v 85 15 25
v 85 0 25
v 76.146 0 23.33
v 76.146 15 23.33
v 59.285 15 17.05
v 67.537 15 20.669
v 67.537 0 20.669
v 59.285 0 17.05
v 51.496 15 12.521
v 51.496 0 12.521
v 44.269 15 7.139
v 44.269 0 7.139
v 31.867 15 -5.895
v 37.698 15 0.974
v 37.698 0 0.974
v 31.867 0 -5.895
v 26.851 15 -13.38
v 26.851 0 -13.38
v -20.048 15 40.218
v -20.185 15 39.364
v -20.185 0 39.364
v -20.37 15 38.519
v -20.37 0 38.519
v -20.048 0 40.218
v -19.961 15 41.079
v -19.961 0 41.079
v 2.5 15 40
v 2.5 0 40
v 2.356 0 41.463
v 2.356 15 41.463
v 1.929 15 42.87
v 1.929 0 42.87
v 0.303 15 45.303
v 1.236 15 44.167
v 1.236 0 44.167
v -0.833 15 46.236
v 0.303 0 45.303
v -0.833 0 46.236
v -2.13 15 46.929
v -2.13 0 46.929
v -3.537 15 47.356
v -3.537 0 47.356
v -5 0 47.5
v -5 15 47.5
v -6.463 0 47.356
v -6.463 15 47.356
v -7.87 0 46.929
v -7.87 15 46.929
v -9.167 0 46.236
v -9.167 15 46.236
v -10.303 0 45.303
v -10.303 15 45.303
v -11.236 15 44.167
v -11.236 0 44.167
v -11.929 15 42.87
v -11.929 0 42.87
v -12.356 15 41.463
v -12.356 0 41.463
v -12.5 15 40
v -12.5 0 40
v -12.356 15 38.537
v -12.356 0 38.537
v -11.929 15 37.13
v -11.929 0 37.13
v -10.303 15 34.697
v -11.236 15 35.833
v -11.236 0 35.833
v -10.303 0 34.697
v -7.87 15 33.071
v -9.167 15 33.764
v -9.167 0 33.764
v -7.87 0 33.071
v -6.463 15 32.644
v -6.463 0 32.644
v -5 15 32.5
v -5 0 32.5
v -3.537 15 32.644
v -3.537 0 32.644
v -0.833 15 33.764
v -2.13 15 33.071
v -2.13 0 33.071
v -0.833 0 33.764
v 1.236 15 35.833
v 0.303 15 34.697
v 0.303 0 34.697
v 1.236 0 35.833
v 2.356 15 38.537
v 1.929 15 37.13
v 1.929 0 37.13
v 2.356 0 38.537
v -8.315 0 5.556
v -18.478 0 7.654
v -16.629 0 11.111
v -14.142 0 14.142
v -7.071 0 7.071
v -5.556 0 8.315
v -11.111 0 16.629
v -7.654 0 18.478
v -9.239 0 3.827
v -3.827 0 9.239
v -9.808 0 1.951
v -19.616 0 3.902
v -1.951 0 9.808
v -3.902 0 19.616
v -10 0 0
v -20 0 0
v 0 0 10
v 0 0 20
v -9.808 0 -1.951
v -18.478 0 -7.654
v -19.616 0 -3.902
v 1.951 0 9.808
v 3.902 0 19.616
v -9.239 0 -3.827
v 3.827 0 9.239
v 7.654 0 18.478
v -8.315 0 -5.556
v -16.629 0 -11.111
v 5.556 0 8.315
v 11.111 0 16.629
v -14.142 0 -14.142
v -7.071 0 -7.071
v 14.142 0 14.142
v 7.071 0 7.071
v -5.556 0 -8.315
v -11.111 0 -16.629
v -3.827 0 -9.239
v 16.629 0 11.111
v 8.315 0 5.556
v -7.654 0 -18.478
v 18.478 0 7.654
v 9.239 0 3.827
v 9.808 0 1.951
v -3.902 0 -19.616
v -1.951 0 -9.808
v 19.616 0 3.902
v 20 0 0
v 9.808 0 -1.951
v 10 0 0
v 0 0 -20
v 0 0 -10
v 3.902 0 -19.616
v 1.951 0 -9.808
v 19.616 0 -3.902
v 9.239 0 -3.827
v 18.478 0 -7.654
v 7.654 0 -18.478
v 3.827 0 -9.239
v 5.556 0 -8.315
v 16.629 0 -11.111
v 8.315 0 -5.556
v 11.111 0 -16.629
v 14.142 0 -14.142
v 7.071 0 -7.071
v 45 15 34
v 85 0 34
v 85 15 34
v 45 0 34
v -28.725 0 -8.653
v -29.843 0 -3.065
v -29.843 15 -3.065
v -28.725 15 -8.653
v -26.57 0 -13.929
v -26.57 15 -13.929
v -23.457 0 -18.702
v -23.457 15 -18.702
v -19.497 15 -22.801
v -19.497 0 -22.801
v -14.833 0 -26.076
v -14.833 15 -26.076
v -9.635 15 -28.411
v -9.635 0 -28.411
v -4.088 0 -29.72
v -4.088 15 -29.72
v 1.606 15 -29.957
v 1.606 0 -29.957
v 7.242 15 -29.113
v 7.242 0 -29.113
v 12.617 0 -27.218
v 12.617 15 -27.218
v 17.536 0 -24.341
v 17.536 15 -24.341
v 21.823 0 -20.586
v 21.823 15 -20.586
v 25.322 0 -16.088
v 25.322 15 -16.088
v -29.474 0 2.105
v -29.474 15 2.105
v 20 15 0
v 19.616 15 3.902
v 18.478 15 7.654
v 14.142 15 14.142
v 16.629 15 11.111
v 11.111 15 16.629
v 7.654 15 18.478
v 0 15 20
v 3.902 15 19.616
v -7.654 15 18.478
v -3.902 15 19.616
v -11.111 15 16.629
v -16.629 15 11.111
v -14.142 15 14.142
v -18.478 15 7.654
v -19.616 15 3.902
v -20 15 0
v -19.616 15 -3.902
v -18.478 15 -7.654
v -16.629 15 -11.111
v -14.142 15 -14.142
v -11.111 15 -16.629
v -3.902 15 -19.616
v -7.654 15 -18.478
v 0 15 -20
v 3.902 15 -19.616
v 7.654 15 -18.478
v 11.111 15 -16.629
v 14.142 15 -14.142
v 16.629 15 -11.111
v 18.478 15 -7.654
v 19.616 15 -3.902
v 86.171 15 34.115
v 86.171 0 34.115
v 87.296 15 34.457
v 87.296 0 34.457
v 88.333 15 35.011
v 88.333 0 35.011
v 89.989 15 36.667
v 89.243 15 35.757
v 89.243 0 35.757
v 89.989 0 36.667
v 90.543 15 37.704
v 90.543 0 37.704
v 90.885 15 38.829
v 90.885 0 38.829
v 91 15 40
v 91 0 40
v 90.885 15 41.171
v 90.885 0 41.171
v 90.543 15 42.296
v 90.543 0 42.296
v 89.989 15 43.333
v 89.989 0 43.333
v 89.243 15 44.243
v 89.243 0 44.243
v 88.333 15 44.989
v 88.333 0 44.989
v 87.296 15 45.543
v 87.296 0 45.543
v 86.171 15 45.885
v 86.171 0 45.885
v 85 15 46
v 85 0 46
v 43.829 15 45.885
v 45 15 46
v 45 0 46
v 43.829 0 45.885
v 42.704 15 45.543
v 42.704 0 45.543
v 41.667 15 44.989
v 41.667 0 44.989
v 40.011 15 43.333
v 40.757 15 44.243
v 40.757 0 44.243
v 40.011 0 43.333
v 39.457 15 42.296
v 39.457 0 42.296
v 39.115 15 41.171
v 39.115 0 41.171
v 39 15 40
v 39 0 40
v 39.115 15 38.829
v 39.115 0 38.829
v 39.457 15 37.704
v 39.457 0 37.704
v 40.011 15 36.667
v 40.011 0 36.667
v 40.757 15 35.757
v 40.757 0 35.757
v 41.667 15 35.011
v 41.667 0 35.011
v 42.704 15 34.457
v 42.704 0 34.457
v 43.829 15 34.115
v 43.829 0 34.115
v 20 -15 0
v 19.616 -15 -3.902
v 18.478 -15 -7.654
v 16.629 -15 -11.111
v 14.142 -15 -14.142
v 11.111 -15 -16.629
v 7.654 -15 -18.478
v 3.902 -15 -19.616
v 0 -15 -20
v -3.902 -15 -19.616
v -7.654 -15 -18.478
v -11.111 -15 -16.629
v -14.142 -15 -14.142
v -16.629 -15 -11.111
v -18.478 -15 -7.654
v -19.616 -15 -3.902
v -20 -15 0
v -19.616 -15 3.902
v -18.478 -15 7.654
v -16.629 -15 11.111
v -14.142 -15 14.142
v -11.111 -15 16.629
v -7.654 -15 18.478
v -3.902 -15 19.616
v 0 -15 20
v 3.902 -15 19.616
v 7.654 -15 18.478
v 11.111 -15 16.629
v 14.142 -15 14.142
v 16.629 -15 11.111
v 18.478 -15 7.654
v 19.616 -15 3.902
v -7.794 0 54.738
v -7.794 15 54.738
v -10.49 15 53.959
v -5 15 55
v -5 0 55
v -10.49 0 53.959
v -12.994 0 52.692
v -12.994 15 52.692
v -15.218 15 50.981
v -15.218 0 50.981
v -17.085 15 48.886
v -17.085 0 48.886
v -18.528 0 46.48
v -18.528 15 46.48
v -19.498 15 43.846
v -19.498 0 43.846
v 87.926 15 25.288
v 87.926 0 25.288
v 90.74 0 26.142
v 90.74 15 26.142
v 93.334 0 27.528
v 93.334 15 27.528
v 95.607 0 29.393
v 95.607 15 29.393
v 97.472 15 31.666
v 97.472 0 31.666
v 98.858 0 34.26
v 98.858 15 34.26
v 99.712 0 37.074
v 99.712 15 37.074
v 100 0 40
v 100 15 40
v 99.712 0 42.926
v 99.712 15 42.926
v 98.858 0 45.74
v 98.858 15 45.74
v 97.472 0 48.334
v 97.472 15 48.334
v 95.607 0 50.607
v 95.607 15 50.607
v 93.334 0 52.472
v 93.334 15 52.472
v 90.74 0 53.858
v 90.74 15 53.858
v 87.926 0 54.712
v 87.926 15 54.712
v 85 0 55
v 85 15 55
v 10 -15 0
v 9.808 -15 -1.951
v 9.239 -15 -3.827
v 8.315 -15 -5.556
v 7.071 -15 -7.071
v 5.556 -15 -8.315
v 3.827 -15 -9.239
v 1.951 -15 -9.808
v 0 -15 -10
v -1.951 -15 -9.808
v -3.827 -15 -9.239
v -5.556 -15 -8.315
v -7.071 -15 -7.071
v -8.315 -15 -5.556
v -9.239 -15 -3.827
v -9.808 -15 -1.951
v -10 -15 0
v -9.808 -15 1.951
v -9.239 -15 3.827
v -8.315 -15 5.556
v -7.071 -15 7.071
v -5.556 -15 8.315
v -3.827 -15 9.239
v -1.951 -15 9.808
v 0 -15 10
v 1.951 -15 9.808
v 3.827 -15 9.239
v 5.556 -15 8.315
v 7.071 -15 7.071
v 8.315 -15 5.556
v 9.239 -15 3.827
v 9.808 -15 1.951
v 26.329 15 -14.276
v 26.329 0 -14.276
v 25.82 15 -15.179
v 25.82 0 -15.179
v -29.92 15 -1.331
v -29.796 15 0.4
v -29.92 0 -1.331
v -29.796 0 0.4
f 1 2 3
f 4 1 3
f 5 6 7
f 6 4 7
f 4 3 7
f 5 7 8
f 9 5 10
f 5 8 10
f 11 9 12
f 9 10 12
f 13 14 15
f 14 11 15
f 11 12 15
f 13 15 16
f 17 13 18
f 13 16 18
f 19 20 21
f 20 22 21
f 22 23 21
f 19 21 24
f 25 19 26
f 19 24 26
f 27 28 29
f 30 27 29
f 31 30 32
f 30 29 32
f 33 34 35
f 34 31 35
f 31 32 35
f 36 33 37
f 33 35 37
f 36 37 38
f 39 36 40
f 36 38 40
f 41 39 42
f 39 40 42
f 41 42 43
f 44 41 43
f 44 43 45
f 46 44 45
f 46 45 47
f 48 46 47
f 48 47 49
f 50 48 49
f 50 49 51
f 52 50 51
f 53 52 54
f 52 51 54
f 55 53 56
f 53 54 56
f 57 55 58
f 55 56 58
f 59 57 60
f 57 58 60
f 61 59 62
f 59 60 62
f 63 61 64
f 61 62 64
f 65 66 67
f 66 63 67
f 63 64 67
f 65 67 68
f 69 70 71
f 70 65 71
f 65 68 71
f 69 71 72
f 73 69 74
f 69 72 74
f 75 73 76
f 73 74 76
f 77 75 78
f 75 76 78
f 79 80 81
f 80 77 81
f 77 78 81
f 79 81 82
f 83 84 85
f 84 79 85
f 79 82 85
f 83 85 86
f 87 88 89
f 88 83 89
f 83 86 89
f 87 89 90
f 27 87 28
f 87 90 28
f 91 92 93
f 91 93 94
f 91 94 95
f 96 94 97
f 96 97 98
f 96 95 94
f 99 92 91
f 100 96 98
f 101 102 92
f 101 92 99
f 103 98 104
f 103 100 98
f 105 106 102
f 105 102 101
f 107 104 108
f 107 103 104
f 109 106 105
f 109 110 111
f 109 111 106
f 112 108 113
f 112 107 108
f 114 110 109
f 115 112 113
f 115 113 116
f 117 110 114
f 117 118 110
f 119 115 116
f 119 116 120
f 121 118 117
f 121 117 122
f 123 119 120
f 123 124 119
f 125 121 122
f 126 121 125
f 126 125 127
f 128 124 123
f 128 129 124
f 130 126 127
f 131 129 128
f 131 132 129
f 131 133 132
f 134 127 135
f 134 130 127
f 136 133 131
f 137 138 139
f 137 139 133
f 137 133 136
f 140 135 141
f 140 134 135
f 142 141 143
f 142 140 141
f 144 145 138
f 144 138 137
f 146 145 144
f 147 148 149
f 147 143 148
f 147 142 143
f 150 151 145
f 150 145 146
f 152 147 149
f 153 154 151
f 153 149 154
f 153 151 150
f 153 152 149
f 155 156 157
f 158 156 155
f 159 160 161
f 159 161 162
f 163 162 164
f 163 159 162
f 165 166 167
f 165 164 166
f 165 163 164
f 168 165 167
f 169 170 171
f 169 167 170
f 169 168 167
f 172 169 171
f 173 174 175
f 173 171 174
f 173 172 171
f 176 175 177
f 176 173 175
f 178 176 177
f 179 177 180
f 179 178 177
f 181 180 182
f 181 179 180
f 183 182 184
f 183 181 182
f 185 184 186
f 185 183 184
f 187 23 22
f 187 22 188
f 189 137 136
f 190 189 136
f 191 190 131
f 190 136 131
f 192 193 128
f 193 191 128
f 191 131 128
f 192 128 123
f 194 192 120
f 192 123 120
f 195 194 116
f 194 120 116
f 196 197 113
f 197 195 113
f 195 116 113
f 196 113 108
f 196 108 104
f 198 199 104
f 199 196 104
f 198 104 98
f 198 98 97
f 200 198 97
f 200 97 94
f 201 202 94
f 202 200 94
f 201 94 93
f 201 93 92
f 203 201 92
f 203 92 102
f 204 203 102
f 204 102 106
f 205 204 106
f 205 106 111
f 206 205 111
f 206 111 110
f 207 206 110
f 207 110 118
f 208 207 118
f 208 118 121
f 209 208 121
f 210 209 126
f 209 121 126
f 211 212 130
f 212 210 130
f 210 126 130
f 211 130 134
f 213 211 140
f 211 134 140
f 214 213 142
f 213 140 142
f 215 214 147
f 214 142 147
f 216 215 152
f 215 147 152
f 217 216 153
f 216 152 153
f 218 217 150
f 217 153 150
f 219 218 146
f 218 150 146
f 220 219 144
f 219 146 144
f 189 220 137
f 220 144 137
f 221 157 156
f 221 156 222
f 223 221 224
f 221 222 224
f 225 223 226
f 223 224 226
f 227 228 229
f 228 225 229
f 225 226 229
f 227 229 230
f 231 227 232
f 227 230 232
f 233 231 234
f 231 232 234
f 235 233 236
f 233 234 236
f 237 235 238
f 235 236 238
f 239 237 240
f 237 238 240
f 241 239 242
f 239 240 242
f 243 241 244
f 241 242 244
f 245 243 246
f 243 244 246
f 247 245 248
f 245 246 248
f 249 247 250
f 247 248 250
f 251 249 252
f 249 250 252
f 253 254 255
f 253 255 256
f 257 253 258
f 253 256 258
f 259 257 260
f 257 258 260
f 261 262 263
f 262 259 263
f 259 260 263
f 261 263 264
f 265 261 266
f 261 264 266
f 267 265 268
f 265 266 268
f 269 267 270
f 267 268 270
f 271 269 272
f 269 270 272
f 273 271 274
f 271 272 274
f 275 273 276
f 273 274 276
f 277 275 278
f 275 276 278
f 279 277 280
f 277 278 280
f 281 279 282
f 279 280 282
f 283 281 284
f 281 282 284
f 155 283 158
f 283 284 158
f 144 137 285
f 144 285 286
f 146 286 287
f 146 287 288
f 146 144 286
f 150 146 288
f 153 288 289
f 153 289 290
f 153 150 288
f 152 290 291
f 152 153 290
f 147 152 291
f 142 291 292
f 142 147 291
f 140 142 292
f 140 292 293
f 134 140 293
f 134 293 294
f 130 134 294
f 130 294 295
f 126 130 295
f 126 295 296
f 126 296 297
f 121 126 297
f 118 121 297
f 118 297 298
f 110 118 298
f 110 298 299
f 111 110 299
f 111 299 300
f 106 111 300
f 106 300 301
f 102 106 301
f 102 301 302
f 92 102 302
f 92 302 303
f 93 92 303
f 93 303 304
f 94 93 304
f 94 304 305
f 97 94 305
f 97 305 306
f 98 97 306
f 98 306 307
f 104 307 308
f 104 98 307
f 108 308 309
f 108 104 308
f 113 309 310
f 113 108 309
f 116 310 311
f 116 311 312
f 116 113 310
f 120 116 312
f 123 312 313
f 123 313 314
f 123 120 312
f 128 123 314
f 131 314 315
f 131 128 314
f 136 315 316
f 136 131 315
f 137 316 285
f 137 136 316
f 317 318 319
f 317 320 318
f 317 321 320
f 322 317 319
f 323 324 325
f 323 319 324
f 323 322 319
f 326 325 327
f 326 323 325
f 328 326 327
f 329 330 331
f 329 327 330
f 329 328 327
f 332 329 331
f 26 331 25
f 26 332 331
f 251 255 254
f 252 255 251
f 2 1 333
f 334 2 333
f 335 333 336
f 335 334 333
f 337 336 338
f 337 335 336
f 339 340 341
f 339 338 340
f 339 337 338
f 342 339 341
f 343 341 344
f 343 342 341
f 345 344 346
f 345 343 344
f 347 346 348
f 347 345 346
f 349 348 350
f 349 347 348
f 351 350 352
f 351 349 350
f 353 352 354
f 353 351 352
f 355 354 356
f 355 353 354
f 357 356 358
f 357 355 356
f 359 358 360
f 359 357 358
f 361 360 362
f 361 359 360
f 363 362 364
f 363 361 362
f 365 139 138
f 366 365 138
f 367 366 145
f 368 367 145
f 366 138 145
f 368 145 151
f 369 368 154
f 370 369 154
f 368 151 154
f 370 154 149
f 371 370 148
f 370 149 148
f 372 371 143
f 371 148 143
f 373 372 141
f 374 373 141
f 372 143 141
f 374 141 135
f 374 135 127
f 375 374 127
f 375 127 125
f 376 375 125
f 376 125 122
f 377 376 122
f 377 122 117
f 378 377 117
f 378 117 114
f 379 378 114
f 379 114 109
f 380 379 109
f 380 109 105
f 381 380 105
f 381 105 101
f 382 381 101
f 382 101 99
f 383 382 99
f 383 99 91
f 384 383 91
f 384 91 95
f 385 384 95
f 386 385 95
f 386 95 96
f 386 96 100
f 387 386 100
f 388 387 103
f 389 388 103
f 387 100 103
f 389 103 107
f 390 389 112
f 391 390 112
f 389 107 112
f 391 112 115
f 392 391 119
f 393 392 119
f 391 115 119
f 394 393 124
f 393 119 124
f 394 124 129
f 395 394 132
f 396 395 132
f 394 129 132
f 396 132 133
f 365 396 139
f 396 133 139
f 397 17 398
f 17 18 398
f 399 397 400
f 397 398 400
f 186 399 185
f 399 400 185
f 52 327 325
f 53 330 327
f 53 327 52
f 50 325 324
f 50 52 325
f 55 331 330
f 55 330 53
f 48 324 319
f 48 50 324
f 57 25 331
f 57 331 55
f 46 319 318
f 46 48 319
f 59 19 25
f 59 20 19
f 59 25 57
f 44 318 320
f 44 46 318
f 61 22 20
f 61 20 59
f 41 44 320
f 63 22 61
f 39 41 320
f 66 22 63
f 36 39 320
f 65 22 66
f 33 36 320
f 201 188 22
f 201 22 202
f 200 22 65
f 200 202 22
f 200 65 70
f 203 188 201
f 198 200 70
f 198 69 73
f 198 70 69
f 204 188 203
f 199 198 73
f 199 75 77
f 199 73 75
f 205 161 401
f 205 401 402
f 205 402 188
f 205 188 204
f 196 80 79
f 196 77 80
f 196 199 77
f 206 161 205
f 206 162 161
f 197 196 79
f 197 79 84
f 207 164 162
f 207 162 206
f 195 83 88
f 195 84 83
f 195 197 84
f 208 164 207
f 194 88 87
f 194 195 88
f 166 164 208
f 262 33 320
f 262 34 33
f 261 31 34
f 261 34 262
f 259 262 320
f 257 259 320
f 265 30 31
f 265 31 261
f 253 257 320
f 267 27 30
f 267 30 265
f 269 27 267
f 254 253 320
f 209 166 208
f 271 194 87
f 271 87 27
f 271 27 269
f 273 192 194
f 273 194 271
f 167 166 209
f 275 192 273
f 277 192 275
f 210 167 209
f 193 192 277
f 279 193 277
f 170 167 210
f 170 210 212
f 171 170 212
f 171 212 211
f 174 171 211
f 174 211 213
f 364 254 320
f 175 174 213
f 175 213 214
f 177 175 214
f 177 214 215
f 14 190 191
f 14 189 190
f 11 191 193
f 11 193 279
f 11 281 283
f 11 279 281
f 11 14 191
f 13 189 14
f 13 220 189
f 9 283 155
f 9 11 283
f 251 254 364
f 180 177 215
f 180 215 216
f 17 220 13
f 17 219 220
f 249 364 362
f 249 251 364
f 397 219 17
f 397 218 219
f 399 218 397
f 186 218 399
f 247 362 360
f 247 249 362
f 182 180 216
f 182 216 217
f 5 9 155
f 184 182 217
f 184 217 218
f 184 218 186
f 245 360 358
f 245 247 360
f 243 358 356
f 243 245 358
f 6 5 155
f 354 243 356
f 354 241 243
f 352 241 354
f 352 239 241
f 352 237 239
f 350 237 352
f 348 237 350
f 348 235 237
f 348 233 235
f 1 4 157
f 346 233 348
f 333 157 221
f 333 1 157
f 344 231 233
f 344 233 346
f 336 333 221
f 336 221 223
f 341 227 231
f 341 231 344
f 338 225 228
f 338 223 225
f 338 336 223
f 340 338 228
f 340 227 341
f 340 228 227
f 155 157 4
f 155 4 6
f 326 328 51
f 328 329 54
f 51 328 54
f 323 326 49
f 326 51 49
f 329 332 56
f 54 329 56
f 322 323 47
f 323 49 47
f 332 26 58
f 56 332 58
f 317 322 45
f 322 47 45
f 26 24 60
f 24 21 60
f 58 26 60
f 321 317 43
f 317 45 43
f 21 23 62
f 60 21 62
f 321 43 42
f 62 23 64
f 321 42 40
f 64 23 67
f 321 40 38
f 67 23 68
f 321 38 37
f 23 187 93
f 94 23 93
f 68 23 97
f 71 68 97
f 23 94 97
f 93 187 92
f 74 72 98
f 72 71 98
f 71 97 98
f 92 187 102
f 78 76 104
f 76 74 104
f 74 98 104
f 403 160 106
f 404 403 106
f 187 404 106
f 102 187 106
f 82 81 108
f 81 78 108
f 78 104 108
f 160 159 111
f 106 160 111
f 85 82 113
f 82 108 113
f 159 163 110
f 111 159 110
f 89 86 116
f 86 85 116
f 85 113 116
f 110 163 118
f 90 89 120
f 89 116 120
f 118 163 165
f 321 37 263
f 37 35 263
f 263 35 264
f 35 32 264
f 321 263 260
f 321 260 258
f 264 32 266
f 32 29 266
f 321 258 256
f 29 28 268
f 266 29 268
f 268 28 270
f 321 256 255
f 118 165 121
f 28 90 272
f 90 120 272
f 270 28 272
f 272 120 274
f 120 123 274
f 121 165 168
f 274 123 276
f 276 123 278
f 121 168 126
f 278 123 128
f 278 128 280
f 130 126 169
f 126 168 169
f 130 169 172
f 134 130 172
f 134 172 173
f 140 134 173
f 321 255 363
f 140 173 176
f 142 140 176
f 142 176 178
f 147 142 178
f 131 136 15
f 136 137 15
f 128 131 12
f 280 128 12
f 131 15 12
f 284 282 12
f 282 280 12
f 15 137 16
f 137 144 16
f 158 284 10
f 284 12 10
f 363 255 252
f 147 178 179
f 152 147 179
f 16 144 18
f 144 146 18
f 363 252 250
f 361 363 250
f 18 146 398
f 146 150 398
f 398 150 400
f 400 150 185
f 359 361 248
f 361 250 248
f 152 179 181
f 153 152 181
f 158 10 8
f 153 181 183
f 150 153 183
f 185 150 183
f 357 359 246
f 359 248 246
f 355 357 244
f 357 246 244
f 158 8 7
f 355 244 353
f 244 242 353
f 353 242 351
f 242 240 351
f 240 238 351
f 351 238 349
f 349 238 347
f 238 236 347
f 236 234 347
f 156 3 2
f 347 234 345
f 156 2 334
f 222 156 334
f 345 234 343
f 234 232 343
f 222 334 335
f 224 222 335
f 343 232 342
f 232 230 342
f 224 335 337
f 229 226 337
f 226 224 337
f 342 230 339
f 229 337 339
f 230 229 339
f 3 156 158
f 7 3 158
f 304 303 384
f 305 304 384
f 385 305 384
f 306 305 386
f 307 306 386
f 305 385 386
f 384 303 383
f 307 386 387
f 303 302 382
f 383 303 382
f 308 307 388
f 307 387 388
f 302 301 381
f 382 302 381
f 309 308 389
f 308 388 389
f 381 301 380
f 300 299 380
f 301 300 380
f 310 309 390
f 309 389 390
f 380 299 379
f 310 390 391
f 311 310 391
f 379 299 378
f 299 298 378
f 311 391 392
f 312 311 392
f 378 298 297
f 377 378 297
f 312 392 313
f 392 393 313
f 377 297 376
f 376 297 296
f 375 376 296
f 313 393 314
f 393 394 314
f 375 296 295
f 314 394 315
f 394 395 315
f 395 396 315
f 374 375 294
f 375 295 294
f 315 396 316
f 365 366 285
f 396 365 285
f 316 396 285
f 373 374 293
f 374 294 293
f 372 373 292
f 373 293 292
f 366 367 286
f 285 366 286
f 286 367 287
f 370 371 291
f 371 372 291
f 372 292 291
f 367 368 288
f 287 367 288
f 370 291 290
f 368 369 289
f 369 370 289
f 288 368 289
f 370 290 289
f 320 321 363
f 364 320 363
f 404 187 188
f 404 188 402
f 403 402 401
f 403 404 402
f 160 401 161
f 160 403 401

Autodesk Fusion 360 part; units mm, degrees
sketch "Sketch1" plane through (0, 0, 0) normal (0, 1, 0) x (1, 0, 0)
  circle A0 centre (0, 0) radius 10
  circle A1 centre (0, 0) radius 20
  circle A2 centre (-5, -40) radius 7.5
  line L0 (85, -34) -> (45, -34)
  arc A3 (45, -34) -> (45, -46) centre (45, -40) ccw
  line L1 (45, -46) -> (85, -46)
  arc A4 (85, -46) -> (85, -34) centre (85, -40) ccw
  line L2 (85, -40) -> (45, -40) construction
  arc A5 (26.8508, 13.3803) -> (-29.843, 3.0652) centre (0, 0) ccw
  arc A6 (-19.9612, -41.0786) -> (-5, -55) centre (-5, -40) ccw
  arc A7 (85, -55) -> (85, -25) centre (85, -40) ccw
  line L3 (-20.3702, -38.5192) -> (-29.4736, -2.1054)
  arc A8 (-19.9612, -41.0786) -> (-20.3702, -38.5192) centre (-34.9223, -42.1572) ccw
  arc A9 (-29.843, 3.0652) -> (-29.4736, -2.1054) centre (-14.9215, 1.5326) ccw
  line L4 (-5, -55) -> (85, -55)
  arc A10 (25.3217, 16.0877) -> (85, -25) centre (95.2804, 53.8161) ccw
  point P0 (65, -40)
  dimension "d1" = 20
  dimension "d2" = 40
  dimension "d3" = 15
  dimension "d4" = 40
  dimension "d5" = 50
  dimension "d6" = 85
  dimension "d7" = 40
  dimension "d8" = 40
  dimension "d9" = 6
  dimension "d10" = 30
  dimension "d11" = 60
  dimension "d12" = 30
  dimension "d13" = 15
  dimension "d14" = 15
extrude "Extrude1" add sketch "Sketch1" along normal blind 15 contours A5 A6 A7 L3 A8 A9 L4 A10 makes body 1
extrude "Extrude2" add sketch "Sketch1" against normal blind 15 separate body contours A1 makes body 2
